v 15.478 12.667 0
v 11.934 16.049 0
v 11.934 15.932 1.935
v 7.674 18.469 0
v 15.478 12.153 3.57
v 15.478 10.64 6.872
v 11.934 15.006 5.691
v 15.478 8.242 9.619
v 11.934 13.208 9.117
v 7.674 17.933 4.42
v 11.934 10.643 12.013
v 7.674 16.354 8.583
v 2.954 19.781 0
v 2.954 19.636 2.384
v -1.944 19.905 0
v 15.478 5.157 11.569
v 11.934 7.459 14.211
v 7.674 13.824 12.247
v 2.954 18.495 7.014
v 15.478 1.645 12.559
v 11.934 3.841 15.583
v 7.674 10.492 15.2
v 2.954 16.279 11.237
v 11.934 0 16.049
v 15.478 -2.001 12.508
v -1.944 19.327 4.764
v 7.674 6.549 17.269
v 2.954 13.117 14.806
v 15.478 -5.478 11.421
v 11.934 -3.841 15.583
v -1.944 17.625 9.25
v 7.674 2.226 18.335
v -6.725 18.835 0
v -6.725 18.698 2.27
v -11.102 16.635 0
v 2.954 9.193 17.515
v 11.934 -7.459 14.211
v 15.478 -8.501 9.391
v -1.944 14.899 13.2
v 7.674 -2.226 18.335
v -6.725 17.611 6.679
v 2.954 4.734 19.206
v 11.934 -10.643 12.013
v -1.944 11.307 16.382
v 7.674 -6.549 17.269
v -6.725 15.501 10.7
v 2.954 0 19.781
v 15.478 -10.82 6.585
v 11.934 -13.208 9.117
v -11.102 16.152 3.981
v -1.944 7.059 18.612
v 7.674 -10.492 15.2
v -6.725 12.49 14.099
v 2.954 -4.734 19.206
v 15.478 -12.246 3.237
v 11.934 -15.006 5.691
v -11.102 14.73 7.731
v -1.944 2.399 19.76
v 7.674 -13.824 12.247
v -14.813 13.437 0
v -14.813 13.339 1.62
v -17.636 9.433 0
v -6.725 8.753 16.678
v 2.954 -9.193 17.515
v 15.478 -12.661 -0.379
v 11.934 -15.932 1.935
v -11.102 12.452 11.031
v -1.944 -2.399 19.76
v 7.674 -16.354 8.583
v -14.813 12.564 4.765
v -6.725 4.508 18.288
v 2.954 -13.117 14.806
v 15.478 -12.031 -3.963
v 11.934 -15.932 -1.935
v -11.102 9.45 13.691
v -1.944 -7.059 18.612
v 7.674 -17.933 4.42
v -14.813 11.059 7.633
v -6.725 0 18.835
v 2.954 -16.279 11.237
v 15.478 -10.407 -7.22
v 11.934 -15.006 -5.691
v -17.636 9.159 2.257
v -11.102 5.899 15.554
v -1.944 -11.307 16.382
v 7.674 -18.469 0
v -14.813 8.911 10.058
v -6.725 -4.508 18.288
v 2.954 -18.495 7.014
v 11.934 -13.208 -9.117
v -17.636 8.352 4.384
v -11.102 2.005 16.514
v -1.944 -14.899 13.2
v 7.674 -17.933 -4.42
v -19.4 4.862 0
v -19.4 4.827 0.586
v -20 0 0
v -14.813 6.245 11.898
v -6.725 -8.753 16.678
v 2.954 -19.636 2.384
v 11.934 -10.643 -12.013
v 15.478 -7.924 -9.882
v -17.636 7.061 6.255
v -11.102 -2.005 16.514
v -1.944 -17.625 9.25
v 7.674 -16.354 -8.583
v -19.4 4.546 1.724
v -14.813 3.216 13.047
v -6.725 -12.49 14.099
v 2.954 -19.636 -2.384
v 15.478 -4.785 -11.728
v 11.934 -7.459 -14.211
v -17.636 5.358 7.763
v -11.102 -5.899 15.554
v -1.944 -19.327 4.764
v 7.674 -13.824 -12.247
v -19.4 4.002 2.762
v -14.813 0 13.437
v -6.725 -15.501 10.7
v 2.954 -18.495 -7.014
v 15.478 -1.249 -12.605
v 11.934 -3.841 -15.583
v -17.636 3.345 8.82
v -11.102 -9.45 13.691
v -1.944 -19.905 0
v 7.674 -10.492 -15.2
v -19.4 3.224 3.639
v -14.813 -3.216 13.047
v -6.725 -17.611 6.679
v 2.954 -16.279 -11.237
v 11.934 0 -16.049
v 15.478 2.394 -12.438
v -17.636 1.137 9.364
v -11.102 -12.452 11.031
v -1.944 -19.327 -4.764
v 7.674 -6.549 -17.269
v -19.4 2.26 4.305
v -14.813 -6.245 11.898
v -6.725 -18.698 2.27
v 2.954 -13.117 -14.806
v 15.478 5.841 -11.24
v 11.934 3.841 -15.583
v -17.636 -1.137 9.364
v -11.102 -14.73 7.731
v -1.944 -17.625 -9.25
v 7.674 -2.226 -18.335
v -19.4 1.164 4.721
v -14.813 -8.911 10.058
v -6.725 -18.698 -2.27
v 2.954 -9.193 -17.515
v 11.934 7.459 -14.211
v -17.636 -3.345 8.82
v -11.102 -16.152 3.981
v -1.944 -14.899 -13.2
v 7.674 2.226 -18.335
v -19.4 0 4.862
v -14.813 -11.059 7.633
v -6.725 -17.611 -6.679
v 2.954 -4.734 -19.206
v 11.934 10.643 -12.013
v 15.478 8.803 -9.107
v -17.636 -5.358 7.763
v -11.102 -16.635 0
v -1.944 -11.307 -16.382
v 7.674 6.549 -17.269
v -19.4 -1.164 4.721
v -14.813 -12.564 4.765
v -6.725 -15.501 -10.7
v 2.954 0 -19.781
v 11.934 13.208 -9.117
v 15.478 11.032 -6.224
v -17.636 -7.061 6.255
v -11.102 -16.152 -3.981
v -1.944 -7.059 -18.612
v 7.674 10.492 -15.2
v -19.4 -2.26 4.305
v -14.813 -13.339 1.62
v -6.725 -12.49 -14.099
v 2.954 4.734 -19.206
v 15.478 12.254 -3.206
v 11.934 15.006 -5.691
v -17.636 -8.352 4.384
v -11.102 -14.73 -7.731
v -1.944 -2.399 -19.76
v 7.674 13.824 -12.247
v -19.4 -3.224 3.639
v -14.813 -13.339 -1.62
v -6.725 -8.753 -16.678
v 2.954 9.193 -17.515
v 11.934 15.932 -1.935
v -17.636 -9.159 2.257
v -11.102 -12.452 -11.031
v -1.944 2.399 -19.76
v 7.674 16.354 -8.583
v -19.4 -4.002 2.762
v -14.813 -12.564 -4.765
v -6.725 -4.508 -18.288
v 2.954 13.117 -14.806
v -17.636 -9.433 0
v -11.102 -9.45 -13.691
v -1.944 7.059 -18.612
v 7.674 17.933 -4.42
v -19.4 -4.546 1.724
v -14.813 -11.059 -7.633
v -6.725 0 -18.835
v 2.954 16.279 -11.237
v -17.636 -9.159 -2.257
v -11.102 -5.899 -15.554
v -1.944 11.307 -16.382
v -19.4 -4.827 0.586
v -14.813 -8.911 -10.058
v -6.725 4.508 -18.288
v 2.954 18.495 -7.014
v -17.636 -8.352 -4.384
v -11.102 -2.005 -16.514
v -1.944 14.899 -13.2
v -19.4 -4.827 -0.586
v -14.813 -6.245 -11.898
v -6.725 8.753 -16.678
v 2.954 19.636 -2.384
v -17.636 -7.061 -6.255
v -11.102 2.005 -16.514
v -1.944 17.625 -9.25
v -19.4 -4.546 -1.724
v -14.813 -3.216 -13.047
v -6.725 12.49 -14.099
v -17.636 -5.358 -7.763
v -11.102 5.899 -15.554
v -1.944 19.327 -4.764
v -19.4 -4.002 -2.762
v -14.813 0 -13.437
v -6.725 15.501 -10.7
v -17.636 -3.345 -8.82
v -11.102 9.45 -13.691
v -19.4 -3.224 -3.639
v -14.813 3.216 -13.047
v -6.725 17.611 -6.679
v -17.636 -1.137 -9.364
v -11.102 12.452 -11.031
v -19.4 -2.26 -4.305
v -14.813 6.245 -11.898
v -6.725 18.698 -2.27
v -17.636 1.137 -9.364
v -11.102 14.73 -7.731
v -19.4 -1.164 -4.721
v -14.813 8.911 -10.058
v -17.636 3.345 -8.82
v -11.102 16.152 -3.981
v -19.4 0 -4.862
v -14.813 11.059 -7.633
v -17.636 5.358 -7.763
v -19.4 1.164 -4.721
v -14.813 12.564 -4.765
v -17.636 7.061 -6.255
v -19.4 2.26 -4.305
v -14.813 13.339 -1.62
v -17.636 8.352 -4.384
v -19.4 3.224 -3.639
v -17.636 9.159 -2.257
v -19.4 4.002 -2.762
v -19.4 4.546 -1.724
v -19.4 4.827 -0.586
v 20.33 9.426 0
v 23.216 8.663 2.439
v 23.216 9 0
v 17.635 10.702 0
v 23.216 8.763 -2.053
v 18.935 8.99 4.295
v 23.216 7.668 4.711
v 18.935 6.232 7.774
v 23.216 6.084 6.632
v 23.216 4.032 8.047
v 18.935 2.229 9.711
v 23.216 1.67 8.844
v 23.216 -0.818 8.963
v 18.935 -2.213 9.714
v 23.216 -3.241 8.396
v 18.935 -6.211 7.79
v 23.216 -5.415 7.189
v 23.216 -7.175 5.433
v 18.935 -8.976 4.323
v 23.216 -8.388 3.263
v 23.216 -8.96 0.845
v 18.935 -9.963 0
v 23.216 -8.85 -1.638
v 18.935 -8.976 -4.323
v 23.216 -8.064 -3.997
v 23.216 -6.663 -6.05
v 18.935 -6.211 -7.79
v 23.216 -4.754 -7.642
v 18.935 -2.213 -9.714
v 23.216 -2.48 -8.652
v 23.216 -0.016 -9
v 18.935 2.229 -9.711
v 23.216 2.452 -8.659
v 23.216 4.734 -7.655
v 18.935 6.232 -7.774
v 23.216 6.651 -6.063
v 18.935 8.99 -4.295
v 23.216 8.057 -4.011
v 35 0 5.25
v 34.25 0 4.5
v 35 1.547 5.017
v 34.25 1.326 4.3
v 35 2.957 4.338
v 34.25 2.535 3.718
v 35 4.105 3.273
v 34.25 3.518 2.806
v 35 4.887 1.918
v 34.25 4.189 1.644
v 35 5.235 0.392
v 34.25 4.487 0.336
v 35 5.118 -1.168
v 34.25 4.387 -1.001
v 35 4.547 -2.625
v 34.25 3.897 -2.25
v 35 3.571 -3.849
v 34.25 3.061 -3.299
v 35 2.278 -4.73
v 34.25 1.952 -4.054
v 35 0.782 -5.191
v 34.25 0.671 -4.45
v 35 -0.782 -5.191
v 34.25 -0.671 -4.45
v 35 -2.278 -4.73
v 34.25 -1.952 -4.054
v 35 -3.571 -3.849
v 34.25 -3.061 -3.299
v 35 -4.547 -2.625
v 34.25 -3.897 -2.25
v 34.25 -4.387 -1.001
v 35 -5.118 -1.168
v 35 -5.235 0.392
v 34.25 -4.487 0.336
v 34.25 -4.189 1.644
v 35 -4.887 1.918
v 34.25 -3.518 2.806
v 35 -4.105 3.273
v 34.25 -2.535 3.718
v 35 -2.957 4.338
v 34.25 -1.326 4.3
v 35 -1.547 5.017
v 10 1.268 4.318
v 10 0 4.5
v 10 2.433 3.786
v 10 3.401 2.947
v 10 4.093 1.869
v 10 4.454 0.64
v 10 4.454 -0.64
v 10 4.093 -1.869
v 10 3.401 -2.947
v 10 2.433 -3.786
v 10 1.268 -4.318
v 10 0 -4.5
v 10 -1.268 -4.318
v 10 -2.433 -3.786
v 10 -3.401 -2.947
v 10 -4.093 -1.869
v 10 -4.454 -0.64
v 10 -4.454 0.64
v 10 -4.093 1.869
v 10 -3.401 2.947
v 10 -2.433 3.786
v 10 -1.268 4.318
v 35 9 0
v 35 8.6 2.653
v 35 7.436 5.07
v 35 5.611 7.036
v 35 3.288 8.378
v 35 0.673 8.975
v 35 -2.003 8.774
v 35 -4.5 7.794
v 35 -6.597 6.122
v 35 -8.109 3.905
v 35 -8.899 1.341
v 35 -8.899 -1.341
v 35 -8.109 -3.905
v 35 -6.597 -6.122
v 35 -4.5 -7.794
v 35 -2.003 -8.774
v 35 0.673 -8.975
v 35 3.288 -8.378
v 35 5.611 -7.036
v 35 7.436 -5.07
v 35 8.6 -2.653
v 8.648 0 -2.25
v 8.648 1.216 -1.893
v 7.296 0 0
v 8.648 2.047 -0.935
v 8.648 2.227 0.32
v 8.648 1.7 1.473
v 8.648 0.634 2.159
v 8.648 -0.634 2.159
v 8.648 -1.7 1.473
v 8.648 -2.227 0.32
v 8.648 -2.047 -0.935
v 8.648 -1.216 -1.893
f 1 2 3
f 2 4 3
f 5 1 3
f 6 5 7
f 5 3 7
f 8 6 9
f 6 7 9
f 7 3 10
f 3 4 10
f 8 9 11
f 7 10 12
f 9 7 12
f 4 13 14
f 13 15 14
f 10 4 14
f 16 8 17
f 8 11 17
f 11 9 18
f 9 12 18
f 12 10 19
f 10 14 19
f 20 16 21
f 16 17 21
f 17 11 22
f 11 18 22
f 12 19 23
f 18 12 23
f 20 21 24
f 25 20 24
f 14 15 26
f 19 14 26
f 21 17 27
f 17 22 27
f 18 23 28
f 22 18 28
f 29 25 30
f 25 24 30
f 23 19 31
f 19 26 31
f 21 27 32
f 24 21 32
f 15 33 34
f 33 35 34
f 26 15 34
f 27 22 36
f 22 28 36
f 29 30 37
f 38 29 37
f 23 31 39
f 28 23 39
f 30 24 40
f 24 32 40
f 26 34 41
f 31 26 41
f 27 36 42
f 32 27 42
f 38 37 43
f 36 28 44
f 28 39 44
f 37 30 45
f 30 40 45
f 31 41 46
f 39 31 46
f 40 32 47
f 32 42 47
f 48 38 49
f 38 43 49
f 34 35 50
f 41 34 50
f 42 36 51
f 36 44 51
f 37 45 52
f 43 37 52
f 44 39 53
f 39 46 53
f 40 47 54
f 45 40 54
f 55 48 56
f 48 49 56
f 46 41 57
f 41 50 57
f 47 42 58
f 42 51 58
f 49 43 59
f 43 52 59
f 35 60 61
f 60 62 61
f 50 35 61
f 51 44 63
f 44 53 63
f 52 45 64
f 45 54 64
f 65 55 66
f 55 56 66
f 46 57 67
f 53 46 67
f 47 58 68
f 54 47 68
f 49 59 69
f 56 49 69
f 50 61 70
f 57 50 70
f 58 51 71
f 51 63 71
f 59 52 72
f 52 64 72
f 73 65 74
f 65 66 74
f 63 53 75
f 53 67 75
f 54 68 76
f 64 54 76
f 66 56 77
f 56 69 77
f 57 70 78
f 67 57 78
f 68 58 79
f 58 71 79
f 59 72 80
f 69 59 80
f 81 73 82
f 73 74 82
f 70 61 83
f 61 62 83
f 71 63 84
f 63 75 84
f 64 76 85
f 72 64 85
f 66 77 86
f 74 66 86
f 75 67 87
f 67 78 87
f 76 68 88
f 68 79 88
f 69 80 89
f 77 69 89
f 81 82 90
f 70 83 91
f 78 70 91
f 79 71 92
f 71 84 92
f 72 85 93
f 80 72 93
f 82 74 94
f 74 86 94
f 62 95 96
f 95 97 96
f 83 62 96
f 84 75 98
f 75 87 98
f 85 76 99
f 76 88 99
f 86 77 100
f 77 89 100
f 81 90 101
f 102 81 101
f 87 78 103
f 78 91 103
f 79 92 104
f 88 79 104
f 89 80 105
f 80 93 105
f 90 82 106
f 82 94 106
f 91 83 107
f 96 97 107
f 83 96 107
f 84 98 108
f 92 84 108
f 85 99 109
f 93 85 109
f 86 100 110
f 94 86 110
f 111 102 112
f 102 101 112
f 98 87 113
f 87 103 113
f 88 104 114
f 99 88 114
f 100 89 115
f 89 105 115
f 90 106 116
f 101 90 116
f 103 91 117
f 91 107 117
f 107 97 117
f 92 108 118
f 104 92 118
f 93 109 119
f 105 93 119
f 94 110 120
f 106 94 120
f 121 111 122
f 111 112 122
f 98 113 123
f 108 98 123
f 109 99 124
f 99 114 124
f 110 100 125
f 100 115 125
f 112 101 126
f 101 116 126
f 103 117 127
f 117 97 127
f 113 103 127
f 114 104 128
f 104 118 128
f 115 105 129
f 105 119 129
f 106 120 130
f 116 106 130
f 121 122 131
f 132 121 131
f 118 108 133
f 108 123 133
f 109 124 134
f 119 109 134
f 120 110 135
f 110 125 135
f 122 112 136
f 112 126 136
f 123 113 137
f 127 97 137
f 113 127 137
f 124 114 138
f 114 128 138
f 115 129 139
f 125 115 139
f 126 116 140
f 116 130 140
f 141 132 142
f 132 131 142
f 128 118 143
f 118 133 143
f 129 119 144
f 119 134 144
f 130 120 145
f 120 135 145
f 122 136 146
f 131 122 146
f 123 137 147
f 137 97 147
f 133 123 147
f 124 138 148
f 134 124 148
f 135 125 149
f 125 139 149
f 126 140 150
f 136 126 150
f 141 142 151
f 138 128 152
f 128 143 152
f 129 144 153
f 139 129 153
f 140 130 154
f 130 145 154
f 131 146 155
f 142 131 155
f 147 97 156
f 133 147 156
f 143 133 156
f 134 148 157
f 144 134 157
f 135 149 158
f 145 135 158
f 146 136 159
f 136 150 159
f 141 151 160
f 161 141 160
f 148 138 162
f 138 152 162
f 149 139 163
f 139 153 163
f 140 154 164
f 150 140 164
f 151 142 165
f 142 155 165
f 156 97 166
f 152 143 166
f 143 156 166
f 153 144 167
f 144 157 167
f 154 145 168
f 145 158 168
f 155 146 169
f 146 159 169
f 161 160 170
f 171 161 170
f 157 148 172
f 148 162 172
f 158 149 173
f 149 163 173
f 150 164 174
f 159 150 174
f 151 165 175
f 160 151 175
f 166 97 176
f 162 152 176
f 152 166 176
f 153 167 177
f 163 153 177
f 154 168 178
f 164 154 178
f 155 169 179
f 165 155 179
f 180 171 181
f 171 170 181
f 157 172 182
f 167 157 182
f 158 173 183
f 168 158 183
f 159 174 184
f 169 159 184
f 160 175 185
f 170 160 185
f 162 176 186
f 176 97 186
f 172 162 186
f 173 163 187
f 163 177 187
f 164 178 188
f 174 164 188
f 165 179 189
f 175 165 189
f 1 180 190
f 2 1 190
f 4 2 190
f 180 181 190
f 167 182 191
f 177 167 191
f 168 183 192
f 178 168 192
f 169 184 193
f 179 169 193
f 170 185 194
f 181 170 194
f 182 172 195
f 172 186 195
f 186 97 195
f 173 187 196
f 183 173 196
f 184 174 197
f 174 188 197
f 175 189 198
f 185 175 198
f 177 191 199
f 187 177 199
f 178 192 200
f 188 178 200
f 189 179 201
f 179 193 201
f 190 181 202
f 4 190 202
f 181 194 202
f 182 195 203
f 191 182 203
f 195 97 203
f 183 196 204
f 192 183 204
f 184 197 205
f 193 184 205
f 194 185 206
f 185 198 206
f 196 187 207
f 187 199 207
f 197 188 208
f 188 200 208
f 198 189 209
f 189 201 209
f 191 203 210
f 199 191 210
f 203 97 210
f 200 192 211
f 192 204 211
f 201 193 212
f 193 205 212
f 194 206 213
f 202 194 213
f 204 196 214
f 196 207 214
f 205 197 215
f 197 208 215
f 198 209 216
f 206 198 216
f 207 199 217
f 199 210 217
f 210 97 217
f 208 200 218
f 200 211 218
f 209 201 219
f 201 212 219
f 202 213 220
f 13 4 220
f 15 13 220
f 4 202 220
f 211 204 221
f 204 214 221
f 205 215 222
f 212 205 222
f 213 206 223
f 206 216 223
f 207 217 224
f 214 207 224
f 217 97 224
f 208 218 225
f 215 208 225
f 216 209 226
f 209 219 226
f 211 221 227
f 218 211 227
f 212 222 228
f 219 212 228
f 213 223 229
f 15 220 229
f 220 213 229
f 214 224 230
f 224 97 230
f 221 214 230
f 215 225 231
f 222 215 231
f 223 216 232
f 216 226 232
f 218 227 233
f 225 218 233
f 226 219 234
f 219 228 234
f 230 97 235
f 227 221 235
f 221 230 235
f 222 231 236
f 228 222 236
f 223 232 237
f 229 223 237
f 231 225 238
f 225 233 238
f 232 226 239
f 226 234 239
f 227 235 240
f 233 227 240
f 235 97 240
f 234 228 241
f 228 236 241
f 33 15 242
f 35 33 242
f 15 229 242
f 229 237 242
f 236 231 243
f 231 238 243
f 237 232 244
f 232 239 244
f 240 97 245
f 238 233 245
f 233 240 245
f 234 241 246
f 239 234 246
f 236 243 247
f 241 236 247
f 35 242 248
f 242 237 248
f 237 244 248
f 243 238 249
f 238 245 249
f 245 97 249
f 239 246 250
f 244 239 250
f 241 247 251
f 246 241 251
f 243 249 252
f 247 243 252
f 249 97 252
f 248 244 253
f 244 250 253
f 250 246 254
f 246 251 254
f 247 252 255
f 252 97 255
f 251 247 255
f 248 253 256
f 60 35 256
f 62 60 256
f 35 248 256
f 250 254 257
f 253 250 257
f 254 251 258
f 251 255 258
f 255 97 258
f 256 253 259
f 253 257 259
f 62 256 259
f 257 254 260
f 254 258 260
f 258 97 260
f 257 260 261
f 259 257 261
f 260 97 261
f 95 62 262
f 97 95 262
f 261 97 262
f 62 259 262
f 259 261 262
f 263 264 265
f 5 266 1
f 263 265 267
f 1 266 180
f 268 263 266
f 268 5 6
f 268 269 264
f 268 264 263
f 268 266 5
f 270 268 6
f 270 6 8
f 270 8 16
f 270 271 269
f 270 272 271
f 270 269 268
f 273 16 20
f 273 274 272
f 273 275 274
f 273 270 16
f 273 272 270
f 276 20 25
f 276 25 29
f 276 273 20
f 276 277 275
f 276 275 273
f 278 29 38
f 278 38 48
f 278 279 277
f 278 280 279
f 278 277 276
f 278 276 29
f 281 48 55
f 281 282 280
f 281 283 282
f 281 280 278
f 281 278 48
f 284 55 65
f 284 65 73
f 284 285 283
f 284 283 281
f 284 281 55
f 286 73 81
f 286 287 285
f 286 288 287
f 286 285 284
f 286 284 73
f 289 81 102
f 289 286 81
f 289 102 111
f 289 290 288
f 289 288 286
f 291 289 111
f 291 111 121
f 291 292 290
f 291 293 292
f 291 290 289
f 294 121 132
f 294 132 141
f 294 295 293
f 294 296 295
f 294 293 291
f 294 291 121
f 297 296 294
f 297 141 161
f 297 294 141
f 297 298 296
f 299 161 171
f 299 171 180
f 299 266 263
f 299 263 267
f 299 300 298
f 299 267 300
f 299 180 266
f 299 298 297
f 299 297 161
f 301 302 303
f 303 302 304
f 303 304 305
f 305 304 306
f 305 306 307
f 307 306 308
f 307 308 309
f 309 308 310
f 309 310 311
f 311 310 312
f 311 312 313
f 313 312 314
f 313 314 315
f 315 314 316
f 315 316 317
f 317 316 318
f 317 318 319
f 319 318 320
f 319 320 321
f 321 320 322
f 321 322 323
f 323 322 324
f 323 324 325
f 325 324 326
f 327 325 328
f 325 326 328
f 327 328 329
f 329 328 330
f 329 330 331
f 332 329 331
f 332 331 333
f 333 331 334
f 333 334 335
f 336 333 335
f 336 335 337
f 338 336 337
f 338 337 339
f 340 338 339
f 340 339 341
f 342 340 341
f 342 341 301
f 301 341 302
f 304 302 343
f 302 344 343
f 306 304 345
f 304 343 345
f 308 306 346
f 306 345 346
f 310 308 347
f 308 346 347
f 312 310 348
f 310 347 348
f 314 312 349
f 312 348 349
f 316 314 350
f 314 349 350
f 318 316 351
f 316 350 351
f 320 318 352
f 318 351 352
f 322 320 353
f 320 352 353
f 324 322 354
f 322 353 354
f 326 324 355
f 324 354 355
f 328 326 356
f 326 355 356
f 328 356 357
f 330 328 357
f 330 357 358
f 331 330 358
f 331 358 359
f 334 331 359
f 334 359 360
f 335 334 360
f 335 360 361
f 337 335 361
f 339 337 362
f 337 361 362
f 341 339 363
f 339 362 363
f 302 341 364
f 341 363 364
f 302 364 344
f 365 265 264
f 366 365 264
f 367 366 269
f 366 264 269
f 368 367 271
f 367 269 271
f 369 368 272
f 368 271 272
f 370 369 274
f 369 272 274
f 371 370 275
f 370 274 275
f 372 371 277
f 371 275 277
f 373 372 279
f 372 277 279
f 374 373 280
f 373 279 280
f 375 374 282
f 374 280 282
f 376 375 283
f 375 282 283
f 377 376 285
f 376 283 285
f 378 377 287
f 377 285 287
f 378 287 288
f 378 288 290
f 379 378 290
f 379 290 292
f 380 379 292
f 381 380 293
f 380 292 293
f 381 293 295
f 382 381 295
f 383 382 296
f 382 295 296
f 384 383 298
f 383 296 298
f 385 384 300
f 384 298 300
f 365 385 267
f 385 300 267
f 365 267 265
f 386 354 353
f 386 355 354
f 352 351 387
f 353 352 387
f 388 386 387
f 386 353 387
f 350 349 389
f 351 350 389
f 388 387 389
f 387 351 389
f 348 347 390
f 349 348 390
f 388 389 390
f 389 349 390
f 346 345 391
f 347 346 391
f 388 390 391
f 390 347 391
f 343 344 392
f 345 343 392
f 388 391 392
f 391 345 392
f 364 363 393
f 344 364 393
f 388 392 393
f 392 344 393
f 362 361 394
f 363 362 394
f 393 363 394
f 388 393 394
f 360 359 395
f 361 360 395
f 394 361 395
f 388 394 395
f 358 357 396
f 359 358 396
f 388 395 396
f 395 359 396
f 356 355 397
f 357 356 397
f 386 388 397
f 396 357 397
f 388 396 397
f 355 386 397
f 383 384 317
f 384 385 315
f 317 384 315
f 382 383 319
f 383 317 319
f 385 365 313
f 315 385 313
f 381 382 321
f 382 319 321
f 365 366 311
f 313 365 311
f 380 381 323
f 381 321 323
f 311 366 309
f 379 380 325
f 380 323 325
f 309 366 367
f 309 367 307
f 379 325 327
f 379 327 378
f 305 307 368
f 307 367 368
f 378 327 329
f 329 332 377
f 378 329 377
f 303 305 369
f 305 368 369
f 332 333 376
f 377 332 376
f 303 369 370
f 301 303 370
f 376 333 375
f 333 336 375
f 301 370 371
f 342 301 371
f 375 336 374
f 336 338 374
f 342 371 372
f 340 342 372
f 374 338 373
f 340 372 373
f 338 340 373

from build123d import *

# Parameters (mm, degrees)
FILLET1_R                        = 10
M10X1_0_TAPPED_HOLE1_D           = 9
M10X1_0_TAPPED_HOLE1_DEPTH       = 25
M10X1_0_TAPPED_HOLE1_CSINK_D     = 10.5
M10X1_0_TAPPED_HOLE1_CSINK_ANGLE = 90
M10X1_0_TAPPED_HOLE1_TIP         = 2.703872786


with BuildPart() as part:
    # Sketch1 → Revolve1 (revolve)
    with BuildSketch(Plane.XY):
        with BuildLine():
            Line((-20, 0), (35, 0))
            Line((35, 0), (35, 9))
            Line((35, 9), (17.860571099, 9))
            ThreePointArc((17.860571099, 9), (-4.625396092, 19.457793066), (-20, 0))
        make_face()
    revolve(axis=Axis((0, 0, 0), (1, 0, 0)))

    # Fillet1
    fillet1_edges = [part.edges().sort_by_distance(p)[0] for p in [
        (17.860571099, -9, 0),
    ]]
    fillet(fillet1_edges, radius=FILLET1_R)

    # M10x1.0 Tapped Hole1
    with Locations(Plane(origin=(35, 0, 0), x_dir=(0, 0, -1), z_dir=(1, 0, 0))):
        with Locations((0, 0)):
            CounterSinkHole(M10X1_0_TAPPED_HOLE1_D / 2, M10X1_0_TAPPED_HOLE1_CSINK_D / 2, depth=M10X1_0_TAPPED_HOLE1_DEPTH, counter_sink_angle=M10X1_0_TAPPED_HOLE1_CSINK_ANGLE)
            with Locations((0, 0, -(M10X1_0_TAPPED_HOLE1_DEPTH + M10X1_0_TAPPED_HOLE1_TIP / 2))):  # 118° drill point
                Cone(0, M10X1_0_TAPPED_HOLE1_D / 2, M10X1_0_TAPPED_HOLE1_TIP, mode=Mode.SUBTRACT)


solid = part.part
